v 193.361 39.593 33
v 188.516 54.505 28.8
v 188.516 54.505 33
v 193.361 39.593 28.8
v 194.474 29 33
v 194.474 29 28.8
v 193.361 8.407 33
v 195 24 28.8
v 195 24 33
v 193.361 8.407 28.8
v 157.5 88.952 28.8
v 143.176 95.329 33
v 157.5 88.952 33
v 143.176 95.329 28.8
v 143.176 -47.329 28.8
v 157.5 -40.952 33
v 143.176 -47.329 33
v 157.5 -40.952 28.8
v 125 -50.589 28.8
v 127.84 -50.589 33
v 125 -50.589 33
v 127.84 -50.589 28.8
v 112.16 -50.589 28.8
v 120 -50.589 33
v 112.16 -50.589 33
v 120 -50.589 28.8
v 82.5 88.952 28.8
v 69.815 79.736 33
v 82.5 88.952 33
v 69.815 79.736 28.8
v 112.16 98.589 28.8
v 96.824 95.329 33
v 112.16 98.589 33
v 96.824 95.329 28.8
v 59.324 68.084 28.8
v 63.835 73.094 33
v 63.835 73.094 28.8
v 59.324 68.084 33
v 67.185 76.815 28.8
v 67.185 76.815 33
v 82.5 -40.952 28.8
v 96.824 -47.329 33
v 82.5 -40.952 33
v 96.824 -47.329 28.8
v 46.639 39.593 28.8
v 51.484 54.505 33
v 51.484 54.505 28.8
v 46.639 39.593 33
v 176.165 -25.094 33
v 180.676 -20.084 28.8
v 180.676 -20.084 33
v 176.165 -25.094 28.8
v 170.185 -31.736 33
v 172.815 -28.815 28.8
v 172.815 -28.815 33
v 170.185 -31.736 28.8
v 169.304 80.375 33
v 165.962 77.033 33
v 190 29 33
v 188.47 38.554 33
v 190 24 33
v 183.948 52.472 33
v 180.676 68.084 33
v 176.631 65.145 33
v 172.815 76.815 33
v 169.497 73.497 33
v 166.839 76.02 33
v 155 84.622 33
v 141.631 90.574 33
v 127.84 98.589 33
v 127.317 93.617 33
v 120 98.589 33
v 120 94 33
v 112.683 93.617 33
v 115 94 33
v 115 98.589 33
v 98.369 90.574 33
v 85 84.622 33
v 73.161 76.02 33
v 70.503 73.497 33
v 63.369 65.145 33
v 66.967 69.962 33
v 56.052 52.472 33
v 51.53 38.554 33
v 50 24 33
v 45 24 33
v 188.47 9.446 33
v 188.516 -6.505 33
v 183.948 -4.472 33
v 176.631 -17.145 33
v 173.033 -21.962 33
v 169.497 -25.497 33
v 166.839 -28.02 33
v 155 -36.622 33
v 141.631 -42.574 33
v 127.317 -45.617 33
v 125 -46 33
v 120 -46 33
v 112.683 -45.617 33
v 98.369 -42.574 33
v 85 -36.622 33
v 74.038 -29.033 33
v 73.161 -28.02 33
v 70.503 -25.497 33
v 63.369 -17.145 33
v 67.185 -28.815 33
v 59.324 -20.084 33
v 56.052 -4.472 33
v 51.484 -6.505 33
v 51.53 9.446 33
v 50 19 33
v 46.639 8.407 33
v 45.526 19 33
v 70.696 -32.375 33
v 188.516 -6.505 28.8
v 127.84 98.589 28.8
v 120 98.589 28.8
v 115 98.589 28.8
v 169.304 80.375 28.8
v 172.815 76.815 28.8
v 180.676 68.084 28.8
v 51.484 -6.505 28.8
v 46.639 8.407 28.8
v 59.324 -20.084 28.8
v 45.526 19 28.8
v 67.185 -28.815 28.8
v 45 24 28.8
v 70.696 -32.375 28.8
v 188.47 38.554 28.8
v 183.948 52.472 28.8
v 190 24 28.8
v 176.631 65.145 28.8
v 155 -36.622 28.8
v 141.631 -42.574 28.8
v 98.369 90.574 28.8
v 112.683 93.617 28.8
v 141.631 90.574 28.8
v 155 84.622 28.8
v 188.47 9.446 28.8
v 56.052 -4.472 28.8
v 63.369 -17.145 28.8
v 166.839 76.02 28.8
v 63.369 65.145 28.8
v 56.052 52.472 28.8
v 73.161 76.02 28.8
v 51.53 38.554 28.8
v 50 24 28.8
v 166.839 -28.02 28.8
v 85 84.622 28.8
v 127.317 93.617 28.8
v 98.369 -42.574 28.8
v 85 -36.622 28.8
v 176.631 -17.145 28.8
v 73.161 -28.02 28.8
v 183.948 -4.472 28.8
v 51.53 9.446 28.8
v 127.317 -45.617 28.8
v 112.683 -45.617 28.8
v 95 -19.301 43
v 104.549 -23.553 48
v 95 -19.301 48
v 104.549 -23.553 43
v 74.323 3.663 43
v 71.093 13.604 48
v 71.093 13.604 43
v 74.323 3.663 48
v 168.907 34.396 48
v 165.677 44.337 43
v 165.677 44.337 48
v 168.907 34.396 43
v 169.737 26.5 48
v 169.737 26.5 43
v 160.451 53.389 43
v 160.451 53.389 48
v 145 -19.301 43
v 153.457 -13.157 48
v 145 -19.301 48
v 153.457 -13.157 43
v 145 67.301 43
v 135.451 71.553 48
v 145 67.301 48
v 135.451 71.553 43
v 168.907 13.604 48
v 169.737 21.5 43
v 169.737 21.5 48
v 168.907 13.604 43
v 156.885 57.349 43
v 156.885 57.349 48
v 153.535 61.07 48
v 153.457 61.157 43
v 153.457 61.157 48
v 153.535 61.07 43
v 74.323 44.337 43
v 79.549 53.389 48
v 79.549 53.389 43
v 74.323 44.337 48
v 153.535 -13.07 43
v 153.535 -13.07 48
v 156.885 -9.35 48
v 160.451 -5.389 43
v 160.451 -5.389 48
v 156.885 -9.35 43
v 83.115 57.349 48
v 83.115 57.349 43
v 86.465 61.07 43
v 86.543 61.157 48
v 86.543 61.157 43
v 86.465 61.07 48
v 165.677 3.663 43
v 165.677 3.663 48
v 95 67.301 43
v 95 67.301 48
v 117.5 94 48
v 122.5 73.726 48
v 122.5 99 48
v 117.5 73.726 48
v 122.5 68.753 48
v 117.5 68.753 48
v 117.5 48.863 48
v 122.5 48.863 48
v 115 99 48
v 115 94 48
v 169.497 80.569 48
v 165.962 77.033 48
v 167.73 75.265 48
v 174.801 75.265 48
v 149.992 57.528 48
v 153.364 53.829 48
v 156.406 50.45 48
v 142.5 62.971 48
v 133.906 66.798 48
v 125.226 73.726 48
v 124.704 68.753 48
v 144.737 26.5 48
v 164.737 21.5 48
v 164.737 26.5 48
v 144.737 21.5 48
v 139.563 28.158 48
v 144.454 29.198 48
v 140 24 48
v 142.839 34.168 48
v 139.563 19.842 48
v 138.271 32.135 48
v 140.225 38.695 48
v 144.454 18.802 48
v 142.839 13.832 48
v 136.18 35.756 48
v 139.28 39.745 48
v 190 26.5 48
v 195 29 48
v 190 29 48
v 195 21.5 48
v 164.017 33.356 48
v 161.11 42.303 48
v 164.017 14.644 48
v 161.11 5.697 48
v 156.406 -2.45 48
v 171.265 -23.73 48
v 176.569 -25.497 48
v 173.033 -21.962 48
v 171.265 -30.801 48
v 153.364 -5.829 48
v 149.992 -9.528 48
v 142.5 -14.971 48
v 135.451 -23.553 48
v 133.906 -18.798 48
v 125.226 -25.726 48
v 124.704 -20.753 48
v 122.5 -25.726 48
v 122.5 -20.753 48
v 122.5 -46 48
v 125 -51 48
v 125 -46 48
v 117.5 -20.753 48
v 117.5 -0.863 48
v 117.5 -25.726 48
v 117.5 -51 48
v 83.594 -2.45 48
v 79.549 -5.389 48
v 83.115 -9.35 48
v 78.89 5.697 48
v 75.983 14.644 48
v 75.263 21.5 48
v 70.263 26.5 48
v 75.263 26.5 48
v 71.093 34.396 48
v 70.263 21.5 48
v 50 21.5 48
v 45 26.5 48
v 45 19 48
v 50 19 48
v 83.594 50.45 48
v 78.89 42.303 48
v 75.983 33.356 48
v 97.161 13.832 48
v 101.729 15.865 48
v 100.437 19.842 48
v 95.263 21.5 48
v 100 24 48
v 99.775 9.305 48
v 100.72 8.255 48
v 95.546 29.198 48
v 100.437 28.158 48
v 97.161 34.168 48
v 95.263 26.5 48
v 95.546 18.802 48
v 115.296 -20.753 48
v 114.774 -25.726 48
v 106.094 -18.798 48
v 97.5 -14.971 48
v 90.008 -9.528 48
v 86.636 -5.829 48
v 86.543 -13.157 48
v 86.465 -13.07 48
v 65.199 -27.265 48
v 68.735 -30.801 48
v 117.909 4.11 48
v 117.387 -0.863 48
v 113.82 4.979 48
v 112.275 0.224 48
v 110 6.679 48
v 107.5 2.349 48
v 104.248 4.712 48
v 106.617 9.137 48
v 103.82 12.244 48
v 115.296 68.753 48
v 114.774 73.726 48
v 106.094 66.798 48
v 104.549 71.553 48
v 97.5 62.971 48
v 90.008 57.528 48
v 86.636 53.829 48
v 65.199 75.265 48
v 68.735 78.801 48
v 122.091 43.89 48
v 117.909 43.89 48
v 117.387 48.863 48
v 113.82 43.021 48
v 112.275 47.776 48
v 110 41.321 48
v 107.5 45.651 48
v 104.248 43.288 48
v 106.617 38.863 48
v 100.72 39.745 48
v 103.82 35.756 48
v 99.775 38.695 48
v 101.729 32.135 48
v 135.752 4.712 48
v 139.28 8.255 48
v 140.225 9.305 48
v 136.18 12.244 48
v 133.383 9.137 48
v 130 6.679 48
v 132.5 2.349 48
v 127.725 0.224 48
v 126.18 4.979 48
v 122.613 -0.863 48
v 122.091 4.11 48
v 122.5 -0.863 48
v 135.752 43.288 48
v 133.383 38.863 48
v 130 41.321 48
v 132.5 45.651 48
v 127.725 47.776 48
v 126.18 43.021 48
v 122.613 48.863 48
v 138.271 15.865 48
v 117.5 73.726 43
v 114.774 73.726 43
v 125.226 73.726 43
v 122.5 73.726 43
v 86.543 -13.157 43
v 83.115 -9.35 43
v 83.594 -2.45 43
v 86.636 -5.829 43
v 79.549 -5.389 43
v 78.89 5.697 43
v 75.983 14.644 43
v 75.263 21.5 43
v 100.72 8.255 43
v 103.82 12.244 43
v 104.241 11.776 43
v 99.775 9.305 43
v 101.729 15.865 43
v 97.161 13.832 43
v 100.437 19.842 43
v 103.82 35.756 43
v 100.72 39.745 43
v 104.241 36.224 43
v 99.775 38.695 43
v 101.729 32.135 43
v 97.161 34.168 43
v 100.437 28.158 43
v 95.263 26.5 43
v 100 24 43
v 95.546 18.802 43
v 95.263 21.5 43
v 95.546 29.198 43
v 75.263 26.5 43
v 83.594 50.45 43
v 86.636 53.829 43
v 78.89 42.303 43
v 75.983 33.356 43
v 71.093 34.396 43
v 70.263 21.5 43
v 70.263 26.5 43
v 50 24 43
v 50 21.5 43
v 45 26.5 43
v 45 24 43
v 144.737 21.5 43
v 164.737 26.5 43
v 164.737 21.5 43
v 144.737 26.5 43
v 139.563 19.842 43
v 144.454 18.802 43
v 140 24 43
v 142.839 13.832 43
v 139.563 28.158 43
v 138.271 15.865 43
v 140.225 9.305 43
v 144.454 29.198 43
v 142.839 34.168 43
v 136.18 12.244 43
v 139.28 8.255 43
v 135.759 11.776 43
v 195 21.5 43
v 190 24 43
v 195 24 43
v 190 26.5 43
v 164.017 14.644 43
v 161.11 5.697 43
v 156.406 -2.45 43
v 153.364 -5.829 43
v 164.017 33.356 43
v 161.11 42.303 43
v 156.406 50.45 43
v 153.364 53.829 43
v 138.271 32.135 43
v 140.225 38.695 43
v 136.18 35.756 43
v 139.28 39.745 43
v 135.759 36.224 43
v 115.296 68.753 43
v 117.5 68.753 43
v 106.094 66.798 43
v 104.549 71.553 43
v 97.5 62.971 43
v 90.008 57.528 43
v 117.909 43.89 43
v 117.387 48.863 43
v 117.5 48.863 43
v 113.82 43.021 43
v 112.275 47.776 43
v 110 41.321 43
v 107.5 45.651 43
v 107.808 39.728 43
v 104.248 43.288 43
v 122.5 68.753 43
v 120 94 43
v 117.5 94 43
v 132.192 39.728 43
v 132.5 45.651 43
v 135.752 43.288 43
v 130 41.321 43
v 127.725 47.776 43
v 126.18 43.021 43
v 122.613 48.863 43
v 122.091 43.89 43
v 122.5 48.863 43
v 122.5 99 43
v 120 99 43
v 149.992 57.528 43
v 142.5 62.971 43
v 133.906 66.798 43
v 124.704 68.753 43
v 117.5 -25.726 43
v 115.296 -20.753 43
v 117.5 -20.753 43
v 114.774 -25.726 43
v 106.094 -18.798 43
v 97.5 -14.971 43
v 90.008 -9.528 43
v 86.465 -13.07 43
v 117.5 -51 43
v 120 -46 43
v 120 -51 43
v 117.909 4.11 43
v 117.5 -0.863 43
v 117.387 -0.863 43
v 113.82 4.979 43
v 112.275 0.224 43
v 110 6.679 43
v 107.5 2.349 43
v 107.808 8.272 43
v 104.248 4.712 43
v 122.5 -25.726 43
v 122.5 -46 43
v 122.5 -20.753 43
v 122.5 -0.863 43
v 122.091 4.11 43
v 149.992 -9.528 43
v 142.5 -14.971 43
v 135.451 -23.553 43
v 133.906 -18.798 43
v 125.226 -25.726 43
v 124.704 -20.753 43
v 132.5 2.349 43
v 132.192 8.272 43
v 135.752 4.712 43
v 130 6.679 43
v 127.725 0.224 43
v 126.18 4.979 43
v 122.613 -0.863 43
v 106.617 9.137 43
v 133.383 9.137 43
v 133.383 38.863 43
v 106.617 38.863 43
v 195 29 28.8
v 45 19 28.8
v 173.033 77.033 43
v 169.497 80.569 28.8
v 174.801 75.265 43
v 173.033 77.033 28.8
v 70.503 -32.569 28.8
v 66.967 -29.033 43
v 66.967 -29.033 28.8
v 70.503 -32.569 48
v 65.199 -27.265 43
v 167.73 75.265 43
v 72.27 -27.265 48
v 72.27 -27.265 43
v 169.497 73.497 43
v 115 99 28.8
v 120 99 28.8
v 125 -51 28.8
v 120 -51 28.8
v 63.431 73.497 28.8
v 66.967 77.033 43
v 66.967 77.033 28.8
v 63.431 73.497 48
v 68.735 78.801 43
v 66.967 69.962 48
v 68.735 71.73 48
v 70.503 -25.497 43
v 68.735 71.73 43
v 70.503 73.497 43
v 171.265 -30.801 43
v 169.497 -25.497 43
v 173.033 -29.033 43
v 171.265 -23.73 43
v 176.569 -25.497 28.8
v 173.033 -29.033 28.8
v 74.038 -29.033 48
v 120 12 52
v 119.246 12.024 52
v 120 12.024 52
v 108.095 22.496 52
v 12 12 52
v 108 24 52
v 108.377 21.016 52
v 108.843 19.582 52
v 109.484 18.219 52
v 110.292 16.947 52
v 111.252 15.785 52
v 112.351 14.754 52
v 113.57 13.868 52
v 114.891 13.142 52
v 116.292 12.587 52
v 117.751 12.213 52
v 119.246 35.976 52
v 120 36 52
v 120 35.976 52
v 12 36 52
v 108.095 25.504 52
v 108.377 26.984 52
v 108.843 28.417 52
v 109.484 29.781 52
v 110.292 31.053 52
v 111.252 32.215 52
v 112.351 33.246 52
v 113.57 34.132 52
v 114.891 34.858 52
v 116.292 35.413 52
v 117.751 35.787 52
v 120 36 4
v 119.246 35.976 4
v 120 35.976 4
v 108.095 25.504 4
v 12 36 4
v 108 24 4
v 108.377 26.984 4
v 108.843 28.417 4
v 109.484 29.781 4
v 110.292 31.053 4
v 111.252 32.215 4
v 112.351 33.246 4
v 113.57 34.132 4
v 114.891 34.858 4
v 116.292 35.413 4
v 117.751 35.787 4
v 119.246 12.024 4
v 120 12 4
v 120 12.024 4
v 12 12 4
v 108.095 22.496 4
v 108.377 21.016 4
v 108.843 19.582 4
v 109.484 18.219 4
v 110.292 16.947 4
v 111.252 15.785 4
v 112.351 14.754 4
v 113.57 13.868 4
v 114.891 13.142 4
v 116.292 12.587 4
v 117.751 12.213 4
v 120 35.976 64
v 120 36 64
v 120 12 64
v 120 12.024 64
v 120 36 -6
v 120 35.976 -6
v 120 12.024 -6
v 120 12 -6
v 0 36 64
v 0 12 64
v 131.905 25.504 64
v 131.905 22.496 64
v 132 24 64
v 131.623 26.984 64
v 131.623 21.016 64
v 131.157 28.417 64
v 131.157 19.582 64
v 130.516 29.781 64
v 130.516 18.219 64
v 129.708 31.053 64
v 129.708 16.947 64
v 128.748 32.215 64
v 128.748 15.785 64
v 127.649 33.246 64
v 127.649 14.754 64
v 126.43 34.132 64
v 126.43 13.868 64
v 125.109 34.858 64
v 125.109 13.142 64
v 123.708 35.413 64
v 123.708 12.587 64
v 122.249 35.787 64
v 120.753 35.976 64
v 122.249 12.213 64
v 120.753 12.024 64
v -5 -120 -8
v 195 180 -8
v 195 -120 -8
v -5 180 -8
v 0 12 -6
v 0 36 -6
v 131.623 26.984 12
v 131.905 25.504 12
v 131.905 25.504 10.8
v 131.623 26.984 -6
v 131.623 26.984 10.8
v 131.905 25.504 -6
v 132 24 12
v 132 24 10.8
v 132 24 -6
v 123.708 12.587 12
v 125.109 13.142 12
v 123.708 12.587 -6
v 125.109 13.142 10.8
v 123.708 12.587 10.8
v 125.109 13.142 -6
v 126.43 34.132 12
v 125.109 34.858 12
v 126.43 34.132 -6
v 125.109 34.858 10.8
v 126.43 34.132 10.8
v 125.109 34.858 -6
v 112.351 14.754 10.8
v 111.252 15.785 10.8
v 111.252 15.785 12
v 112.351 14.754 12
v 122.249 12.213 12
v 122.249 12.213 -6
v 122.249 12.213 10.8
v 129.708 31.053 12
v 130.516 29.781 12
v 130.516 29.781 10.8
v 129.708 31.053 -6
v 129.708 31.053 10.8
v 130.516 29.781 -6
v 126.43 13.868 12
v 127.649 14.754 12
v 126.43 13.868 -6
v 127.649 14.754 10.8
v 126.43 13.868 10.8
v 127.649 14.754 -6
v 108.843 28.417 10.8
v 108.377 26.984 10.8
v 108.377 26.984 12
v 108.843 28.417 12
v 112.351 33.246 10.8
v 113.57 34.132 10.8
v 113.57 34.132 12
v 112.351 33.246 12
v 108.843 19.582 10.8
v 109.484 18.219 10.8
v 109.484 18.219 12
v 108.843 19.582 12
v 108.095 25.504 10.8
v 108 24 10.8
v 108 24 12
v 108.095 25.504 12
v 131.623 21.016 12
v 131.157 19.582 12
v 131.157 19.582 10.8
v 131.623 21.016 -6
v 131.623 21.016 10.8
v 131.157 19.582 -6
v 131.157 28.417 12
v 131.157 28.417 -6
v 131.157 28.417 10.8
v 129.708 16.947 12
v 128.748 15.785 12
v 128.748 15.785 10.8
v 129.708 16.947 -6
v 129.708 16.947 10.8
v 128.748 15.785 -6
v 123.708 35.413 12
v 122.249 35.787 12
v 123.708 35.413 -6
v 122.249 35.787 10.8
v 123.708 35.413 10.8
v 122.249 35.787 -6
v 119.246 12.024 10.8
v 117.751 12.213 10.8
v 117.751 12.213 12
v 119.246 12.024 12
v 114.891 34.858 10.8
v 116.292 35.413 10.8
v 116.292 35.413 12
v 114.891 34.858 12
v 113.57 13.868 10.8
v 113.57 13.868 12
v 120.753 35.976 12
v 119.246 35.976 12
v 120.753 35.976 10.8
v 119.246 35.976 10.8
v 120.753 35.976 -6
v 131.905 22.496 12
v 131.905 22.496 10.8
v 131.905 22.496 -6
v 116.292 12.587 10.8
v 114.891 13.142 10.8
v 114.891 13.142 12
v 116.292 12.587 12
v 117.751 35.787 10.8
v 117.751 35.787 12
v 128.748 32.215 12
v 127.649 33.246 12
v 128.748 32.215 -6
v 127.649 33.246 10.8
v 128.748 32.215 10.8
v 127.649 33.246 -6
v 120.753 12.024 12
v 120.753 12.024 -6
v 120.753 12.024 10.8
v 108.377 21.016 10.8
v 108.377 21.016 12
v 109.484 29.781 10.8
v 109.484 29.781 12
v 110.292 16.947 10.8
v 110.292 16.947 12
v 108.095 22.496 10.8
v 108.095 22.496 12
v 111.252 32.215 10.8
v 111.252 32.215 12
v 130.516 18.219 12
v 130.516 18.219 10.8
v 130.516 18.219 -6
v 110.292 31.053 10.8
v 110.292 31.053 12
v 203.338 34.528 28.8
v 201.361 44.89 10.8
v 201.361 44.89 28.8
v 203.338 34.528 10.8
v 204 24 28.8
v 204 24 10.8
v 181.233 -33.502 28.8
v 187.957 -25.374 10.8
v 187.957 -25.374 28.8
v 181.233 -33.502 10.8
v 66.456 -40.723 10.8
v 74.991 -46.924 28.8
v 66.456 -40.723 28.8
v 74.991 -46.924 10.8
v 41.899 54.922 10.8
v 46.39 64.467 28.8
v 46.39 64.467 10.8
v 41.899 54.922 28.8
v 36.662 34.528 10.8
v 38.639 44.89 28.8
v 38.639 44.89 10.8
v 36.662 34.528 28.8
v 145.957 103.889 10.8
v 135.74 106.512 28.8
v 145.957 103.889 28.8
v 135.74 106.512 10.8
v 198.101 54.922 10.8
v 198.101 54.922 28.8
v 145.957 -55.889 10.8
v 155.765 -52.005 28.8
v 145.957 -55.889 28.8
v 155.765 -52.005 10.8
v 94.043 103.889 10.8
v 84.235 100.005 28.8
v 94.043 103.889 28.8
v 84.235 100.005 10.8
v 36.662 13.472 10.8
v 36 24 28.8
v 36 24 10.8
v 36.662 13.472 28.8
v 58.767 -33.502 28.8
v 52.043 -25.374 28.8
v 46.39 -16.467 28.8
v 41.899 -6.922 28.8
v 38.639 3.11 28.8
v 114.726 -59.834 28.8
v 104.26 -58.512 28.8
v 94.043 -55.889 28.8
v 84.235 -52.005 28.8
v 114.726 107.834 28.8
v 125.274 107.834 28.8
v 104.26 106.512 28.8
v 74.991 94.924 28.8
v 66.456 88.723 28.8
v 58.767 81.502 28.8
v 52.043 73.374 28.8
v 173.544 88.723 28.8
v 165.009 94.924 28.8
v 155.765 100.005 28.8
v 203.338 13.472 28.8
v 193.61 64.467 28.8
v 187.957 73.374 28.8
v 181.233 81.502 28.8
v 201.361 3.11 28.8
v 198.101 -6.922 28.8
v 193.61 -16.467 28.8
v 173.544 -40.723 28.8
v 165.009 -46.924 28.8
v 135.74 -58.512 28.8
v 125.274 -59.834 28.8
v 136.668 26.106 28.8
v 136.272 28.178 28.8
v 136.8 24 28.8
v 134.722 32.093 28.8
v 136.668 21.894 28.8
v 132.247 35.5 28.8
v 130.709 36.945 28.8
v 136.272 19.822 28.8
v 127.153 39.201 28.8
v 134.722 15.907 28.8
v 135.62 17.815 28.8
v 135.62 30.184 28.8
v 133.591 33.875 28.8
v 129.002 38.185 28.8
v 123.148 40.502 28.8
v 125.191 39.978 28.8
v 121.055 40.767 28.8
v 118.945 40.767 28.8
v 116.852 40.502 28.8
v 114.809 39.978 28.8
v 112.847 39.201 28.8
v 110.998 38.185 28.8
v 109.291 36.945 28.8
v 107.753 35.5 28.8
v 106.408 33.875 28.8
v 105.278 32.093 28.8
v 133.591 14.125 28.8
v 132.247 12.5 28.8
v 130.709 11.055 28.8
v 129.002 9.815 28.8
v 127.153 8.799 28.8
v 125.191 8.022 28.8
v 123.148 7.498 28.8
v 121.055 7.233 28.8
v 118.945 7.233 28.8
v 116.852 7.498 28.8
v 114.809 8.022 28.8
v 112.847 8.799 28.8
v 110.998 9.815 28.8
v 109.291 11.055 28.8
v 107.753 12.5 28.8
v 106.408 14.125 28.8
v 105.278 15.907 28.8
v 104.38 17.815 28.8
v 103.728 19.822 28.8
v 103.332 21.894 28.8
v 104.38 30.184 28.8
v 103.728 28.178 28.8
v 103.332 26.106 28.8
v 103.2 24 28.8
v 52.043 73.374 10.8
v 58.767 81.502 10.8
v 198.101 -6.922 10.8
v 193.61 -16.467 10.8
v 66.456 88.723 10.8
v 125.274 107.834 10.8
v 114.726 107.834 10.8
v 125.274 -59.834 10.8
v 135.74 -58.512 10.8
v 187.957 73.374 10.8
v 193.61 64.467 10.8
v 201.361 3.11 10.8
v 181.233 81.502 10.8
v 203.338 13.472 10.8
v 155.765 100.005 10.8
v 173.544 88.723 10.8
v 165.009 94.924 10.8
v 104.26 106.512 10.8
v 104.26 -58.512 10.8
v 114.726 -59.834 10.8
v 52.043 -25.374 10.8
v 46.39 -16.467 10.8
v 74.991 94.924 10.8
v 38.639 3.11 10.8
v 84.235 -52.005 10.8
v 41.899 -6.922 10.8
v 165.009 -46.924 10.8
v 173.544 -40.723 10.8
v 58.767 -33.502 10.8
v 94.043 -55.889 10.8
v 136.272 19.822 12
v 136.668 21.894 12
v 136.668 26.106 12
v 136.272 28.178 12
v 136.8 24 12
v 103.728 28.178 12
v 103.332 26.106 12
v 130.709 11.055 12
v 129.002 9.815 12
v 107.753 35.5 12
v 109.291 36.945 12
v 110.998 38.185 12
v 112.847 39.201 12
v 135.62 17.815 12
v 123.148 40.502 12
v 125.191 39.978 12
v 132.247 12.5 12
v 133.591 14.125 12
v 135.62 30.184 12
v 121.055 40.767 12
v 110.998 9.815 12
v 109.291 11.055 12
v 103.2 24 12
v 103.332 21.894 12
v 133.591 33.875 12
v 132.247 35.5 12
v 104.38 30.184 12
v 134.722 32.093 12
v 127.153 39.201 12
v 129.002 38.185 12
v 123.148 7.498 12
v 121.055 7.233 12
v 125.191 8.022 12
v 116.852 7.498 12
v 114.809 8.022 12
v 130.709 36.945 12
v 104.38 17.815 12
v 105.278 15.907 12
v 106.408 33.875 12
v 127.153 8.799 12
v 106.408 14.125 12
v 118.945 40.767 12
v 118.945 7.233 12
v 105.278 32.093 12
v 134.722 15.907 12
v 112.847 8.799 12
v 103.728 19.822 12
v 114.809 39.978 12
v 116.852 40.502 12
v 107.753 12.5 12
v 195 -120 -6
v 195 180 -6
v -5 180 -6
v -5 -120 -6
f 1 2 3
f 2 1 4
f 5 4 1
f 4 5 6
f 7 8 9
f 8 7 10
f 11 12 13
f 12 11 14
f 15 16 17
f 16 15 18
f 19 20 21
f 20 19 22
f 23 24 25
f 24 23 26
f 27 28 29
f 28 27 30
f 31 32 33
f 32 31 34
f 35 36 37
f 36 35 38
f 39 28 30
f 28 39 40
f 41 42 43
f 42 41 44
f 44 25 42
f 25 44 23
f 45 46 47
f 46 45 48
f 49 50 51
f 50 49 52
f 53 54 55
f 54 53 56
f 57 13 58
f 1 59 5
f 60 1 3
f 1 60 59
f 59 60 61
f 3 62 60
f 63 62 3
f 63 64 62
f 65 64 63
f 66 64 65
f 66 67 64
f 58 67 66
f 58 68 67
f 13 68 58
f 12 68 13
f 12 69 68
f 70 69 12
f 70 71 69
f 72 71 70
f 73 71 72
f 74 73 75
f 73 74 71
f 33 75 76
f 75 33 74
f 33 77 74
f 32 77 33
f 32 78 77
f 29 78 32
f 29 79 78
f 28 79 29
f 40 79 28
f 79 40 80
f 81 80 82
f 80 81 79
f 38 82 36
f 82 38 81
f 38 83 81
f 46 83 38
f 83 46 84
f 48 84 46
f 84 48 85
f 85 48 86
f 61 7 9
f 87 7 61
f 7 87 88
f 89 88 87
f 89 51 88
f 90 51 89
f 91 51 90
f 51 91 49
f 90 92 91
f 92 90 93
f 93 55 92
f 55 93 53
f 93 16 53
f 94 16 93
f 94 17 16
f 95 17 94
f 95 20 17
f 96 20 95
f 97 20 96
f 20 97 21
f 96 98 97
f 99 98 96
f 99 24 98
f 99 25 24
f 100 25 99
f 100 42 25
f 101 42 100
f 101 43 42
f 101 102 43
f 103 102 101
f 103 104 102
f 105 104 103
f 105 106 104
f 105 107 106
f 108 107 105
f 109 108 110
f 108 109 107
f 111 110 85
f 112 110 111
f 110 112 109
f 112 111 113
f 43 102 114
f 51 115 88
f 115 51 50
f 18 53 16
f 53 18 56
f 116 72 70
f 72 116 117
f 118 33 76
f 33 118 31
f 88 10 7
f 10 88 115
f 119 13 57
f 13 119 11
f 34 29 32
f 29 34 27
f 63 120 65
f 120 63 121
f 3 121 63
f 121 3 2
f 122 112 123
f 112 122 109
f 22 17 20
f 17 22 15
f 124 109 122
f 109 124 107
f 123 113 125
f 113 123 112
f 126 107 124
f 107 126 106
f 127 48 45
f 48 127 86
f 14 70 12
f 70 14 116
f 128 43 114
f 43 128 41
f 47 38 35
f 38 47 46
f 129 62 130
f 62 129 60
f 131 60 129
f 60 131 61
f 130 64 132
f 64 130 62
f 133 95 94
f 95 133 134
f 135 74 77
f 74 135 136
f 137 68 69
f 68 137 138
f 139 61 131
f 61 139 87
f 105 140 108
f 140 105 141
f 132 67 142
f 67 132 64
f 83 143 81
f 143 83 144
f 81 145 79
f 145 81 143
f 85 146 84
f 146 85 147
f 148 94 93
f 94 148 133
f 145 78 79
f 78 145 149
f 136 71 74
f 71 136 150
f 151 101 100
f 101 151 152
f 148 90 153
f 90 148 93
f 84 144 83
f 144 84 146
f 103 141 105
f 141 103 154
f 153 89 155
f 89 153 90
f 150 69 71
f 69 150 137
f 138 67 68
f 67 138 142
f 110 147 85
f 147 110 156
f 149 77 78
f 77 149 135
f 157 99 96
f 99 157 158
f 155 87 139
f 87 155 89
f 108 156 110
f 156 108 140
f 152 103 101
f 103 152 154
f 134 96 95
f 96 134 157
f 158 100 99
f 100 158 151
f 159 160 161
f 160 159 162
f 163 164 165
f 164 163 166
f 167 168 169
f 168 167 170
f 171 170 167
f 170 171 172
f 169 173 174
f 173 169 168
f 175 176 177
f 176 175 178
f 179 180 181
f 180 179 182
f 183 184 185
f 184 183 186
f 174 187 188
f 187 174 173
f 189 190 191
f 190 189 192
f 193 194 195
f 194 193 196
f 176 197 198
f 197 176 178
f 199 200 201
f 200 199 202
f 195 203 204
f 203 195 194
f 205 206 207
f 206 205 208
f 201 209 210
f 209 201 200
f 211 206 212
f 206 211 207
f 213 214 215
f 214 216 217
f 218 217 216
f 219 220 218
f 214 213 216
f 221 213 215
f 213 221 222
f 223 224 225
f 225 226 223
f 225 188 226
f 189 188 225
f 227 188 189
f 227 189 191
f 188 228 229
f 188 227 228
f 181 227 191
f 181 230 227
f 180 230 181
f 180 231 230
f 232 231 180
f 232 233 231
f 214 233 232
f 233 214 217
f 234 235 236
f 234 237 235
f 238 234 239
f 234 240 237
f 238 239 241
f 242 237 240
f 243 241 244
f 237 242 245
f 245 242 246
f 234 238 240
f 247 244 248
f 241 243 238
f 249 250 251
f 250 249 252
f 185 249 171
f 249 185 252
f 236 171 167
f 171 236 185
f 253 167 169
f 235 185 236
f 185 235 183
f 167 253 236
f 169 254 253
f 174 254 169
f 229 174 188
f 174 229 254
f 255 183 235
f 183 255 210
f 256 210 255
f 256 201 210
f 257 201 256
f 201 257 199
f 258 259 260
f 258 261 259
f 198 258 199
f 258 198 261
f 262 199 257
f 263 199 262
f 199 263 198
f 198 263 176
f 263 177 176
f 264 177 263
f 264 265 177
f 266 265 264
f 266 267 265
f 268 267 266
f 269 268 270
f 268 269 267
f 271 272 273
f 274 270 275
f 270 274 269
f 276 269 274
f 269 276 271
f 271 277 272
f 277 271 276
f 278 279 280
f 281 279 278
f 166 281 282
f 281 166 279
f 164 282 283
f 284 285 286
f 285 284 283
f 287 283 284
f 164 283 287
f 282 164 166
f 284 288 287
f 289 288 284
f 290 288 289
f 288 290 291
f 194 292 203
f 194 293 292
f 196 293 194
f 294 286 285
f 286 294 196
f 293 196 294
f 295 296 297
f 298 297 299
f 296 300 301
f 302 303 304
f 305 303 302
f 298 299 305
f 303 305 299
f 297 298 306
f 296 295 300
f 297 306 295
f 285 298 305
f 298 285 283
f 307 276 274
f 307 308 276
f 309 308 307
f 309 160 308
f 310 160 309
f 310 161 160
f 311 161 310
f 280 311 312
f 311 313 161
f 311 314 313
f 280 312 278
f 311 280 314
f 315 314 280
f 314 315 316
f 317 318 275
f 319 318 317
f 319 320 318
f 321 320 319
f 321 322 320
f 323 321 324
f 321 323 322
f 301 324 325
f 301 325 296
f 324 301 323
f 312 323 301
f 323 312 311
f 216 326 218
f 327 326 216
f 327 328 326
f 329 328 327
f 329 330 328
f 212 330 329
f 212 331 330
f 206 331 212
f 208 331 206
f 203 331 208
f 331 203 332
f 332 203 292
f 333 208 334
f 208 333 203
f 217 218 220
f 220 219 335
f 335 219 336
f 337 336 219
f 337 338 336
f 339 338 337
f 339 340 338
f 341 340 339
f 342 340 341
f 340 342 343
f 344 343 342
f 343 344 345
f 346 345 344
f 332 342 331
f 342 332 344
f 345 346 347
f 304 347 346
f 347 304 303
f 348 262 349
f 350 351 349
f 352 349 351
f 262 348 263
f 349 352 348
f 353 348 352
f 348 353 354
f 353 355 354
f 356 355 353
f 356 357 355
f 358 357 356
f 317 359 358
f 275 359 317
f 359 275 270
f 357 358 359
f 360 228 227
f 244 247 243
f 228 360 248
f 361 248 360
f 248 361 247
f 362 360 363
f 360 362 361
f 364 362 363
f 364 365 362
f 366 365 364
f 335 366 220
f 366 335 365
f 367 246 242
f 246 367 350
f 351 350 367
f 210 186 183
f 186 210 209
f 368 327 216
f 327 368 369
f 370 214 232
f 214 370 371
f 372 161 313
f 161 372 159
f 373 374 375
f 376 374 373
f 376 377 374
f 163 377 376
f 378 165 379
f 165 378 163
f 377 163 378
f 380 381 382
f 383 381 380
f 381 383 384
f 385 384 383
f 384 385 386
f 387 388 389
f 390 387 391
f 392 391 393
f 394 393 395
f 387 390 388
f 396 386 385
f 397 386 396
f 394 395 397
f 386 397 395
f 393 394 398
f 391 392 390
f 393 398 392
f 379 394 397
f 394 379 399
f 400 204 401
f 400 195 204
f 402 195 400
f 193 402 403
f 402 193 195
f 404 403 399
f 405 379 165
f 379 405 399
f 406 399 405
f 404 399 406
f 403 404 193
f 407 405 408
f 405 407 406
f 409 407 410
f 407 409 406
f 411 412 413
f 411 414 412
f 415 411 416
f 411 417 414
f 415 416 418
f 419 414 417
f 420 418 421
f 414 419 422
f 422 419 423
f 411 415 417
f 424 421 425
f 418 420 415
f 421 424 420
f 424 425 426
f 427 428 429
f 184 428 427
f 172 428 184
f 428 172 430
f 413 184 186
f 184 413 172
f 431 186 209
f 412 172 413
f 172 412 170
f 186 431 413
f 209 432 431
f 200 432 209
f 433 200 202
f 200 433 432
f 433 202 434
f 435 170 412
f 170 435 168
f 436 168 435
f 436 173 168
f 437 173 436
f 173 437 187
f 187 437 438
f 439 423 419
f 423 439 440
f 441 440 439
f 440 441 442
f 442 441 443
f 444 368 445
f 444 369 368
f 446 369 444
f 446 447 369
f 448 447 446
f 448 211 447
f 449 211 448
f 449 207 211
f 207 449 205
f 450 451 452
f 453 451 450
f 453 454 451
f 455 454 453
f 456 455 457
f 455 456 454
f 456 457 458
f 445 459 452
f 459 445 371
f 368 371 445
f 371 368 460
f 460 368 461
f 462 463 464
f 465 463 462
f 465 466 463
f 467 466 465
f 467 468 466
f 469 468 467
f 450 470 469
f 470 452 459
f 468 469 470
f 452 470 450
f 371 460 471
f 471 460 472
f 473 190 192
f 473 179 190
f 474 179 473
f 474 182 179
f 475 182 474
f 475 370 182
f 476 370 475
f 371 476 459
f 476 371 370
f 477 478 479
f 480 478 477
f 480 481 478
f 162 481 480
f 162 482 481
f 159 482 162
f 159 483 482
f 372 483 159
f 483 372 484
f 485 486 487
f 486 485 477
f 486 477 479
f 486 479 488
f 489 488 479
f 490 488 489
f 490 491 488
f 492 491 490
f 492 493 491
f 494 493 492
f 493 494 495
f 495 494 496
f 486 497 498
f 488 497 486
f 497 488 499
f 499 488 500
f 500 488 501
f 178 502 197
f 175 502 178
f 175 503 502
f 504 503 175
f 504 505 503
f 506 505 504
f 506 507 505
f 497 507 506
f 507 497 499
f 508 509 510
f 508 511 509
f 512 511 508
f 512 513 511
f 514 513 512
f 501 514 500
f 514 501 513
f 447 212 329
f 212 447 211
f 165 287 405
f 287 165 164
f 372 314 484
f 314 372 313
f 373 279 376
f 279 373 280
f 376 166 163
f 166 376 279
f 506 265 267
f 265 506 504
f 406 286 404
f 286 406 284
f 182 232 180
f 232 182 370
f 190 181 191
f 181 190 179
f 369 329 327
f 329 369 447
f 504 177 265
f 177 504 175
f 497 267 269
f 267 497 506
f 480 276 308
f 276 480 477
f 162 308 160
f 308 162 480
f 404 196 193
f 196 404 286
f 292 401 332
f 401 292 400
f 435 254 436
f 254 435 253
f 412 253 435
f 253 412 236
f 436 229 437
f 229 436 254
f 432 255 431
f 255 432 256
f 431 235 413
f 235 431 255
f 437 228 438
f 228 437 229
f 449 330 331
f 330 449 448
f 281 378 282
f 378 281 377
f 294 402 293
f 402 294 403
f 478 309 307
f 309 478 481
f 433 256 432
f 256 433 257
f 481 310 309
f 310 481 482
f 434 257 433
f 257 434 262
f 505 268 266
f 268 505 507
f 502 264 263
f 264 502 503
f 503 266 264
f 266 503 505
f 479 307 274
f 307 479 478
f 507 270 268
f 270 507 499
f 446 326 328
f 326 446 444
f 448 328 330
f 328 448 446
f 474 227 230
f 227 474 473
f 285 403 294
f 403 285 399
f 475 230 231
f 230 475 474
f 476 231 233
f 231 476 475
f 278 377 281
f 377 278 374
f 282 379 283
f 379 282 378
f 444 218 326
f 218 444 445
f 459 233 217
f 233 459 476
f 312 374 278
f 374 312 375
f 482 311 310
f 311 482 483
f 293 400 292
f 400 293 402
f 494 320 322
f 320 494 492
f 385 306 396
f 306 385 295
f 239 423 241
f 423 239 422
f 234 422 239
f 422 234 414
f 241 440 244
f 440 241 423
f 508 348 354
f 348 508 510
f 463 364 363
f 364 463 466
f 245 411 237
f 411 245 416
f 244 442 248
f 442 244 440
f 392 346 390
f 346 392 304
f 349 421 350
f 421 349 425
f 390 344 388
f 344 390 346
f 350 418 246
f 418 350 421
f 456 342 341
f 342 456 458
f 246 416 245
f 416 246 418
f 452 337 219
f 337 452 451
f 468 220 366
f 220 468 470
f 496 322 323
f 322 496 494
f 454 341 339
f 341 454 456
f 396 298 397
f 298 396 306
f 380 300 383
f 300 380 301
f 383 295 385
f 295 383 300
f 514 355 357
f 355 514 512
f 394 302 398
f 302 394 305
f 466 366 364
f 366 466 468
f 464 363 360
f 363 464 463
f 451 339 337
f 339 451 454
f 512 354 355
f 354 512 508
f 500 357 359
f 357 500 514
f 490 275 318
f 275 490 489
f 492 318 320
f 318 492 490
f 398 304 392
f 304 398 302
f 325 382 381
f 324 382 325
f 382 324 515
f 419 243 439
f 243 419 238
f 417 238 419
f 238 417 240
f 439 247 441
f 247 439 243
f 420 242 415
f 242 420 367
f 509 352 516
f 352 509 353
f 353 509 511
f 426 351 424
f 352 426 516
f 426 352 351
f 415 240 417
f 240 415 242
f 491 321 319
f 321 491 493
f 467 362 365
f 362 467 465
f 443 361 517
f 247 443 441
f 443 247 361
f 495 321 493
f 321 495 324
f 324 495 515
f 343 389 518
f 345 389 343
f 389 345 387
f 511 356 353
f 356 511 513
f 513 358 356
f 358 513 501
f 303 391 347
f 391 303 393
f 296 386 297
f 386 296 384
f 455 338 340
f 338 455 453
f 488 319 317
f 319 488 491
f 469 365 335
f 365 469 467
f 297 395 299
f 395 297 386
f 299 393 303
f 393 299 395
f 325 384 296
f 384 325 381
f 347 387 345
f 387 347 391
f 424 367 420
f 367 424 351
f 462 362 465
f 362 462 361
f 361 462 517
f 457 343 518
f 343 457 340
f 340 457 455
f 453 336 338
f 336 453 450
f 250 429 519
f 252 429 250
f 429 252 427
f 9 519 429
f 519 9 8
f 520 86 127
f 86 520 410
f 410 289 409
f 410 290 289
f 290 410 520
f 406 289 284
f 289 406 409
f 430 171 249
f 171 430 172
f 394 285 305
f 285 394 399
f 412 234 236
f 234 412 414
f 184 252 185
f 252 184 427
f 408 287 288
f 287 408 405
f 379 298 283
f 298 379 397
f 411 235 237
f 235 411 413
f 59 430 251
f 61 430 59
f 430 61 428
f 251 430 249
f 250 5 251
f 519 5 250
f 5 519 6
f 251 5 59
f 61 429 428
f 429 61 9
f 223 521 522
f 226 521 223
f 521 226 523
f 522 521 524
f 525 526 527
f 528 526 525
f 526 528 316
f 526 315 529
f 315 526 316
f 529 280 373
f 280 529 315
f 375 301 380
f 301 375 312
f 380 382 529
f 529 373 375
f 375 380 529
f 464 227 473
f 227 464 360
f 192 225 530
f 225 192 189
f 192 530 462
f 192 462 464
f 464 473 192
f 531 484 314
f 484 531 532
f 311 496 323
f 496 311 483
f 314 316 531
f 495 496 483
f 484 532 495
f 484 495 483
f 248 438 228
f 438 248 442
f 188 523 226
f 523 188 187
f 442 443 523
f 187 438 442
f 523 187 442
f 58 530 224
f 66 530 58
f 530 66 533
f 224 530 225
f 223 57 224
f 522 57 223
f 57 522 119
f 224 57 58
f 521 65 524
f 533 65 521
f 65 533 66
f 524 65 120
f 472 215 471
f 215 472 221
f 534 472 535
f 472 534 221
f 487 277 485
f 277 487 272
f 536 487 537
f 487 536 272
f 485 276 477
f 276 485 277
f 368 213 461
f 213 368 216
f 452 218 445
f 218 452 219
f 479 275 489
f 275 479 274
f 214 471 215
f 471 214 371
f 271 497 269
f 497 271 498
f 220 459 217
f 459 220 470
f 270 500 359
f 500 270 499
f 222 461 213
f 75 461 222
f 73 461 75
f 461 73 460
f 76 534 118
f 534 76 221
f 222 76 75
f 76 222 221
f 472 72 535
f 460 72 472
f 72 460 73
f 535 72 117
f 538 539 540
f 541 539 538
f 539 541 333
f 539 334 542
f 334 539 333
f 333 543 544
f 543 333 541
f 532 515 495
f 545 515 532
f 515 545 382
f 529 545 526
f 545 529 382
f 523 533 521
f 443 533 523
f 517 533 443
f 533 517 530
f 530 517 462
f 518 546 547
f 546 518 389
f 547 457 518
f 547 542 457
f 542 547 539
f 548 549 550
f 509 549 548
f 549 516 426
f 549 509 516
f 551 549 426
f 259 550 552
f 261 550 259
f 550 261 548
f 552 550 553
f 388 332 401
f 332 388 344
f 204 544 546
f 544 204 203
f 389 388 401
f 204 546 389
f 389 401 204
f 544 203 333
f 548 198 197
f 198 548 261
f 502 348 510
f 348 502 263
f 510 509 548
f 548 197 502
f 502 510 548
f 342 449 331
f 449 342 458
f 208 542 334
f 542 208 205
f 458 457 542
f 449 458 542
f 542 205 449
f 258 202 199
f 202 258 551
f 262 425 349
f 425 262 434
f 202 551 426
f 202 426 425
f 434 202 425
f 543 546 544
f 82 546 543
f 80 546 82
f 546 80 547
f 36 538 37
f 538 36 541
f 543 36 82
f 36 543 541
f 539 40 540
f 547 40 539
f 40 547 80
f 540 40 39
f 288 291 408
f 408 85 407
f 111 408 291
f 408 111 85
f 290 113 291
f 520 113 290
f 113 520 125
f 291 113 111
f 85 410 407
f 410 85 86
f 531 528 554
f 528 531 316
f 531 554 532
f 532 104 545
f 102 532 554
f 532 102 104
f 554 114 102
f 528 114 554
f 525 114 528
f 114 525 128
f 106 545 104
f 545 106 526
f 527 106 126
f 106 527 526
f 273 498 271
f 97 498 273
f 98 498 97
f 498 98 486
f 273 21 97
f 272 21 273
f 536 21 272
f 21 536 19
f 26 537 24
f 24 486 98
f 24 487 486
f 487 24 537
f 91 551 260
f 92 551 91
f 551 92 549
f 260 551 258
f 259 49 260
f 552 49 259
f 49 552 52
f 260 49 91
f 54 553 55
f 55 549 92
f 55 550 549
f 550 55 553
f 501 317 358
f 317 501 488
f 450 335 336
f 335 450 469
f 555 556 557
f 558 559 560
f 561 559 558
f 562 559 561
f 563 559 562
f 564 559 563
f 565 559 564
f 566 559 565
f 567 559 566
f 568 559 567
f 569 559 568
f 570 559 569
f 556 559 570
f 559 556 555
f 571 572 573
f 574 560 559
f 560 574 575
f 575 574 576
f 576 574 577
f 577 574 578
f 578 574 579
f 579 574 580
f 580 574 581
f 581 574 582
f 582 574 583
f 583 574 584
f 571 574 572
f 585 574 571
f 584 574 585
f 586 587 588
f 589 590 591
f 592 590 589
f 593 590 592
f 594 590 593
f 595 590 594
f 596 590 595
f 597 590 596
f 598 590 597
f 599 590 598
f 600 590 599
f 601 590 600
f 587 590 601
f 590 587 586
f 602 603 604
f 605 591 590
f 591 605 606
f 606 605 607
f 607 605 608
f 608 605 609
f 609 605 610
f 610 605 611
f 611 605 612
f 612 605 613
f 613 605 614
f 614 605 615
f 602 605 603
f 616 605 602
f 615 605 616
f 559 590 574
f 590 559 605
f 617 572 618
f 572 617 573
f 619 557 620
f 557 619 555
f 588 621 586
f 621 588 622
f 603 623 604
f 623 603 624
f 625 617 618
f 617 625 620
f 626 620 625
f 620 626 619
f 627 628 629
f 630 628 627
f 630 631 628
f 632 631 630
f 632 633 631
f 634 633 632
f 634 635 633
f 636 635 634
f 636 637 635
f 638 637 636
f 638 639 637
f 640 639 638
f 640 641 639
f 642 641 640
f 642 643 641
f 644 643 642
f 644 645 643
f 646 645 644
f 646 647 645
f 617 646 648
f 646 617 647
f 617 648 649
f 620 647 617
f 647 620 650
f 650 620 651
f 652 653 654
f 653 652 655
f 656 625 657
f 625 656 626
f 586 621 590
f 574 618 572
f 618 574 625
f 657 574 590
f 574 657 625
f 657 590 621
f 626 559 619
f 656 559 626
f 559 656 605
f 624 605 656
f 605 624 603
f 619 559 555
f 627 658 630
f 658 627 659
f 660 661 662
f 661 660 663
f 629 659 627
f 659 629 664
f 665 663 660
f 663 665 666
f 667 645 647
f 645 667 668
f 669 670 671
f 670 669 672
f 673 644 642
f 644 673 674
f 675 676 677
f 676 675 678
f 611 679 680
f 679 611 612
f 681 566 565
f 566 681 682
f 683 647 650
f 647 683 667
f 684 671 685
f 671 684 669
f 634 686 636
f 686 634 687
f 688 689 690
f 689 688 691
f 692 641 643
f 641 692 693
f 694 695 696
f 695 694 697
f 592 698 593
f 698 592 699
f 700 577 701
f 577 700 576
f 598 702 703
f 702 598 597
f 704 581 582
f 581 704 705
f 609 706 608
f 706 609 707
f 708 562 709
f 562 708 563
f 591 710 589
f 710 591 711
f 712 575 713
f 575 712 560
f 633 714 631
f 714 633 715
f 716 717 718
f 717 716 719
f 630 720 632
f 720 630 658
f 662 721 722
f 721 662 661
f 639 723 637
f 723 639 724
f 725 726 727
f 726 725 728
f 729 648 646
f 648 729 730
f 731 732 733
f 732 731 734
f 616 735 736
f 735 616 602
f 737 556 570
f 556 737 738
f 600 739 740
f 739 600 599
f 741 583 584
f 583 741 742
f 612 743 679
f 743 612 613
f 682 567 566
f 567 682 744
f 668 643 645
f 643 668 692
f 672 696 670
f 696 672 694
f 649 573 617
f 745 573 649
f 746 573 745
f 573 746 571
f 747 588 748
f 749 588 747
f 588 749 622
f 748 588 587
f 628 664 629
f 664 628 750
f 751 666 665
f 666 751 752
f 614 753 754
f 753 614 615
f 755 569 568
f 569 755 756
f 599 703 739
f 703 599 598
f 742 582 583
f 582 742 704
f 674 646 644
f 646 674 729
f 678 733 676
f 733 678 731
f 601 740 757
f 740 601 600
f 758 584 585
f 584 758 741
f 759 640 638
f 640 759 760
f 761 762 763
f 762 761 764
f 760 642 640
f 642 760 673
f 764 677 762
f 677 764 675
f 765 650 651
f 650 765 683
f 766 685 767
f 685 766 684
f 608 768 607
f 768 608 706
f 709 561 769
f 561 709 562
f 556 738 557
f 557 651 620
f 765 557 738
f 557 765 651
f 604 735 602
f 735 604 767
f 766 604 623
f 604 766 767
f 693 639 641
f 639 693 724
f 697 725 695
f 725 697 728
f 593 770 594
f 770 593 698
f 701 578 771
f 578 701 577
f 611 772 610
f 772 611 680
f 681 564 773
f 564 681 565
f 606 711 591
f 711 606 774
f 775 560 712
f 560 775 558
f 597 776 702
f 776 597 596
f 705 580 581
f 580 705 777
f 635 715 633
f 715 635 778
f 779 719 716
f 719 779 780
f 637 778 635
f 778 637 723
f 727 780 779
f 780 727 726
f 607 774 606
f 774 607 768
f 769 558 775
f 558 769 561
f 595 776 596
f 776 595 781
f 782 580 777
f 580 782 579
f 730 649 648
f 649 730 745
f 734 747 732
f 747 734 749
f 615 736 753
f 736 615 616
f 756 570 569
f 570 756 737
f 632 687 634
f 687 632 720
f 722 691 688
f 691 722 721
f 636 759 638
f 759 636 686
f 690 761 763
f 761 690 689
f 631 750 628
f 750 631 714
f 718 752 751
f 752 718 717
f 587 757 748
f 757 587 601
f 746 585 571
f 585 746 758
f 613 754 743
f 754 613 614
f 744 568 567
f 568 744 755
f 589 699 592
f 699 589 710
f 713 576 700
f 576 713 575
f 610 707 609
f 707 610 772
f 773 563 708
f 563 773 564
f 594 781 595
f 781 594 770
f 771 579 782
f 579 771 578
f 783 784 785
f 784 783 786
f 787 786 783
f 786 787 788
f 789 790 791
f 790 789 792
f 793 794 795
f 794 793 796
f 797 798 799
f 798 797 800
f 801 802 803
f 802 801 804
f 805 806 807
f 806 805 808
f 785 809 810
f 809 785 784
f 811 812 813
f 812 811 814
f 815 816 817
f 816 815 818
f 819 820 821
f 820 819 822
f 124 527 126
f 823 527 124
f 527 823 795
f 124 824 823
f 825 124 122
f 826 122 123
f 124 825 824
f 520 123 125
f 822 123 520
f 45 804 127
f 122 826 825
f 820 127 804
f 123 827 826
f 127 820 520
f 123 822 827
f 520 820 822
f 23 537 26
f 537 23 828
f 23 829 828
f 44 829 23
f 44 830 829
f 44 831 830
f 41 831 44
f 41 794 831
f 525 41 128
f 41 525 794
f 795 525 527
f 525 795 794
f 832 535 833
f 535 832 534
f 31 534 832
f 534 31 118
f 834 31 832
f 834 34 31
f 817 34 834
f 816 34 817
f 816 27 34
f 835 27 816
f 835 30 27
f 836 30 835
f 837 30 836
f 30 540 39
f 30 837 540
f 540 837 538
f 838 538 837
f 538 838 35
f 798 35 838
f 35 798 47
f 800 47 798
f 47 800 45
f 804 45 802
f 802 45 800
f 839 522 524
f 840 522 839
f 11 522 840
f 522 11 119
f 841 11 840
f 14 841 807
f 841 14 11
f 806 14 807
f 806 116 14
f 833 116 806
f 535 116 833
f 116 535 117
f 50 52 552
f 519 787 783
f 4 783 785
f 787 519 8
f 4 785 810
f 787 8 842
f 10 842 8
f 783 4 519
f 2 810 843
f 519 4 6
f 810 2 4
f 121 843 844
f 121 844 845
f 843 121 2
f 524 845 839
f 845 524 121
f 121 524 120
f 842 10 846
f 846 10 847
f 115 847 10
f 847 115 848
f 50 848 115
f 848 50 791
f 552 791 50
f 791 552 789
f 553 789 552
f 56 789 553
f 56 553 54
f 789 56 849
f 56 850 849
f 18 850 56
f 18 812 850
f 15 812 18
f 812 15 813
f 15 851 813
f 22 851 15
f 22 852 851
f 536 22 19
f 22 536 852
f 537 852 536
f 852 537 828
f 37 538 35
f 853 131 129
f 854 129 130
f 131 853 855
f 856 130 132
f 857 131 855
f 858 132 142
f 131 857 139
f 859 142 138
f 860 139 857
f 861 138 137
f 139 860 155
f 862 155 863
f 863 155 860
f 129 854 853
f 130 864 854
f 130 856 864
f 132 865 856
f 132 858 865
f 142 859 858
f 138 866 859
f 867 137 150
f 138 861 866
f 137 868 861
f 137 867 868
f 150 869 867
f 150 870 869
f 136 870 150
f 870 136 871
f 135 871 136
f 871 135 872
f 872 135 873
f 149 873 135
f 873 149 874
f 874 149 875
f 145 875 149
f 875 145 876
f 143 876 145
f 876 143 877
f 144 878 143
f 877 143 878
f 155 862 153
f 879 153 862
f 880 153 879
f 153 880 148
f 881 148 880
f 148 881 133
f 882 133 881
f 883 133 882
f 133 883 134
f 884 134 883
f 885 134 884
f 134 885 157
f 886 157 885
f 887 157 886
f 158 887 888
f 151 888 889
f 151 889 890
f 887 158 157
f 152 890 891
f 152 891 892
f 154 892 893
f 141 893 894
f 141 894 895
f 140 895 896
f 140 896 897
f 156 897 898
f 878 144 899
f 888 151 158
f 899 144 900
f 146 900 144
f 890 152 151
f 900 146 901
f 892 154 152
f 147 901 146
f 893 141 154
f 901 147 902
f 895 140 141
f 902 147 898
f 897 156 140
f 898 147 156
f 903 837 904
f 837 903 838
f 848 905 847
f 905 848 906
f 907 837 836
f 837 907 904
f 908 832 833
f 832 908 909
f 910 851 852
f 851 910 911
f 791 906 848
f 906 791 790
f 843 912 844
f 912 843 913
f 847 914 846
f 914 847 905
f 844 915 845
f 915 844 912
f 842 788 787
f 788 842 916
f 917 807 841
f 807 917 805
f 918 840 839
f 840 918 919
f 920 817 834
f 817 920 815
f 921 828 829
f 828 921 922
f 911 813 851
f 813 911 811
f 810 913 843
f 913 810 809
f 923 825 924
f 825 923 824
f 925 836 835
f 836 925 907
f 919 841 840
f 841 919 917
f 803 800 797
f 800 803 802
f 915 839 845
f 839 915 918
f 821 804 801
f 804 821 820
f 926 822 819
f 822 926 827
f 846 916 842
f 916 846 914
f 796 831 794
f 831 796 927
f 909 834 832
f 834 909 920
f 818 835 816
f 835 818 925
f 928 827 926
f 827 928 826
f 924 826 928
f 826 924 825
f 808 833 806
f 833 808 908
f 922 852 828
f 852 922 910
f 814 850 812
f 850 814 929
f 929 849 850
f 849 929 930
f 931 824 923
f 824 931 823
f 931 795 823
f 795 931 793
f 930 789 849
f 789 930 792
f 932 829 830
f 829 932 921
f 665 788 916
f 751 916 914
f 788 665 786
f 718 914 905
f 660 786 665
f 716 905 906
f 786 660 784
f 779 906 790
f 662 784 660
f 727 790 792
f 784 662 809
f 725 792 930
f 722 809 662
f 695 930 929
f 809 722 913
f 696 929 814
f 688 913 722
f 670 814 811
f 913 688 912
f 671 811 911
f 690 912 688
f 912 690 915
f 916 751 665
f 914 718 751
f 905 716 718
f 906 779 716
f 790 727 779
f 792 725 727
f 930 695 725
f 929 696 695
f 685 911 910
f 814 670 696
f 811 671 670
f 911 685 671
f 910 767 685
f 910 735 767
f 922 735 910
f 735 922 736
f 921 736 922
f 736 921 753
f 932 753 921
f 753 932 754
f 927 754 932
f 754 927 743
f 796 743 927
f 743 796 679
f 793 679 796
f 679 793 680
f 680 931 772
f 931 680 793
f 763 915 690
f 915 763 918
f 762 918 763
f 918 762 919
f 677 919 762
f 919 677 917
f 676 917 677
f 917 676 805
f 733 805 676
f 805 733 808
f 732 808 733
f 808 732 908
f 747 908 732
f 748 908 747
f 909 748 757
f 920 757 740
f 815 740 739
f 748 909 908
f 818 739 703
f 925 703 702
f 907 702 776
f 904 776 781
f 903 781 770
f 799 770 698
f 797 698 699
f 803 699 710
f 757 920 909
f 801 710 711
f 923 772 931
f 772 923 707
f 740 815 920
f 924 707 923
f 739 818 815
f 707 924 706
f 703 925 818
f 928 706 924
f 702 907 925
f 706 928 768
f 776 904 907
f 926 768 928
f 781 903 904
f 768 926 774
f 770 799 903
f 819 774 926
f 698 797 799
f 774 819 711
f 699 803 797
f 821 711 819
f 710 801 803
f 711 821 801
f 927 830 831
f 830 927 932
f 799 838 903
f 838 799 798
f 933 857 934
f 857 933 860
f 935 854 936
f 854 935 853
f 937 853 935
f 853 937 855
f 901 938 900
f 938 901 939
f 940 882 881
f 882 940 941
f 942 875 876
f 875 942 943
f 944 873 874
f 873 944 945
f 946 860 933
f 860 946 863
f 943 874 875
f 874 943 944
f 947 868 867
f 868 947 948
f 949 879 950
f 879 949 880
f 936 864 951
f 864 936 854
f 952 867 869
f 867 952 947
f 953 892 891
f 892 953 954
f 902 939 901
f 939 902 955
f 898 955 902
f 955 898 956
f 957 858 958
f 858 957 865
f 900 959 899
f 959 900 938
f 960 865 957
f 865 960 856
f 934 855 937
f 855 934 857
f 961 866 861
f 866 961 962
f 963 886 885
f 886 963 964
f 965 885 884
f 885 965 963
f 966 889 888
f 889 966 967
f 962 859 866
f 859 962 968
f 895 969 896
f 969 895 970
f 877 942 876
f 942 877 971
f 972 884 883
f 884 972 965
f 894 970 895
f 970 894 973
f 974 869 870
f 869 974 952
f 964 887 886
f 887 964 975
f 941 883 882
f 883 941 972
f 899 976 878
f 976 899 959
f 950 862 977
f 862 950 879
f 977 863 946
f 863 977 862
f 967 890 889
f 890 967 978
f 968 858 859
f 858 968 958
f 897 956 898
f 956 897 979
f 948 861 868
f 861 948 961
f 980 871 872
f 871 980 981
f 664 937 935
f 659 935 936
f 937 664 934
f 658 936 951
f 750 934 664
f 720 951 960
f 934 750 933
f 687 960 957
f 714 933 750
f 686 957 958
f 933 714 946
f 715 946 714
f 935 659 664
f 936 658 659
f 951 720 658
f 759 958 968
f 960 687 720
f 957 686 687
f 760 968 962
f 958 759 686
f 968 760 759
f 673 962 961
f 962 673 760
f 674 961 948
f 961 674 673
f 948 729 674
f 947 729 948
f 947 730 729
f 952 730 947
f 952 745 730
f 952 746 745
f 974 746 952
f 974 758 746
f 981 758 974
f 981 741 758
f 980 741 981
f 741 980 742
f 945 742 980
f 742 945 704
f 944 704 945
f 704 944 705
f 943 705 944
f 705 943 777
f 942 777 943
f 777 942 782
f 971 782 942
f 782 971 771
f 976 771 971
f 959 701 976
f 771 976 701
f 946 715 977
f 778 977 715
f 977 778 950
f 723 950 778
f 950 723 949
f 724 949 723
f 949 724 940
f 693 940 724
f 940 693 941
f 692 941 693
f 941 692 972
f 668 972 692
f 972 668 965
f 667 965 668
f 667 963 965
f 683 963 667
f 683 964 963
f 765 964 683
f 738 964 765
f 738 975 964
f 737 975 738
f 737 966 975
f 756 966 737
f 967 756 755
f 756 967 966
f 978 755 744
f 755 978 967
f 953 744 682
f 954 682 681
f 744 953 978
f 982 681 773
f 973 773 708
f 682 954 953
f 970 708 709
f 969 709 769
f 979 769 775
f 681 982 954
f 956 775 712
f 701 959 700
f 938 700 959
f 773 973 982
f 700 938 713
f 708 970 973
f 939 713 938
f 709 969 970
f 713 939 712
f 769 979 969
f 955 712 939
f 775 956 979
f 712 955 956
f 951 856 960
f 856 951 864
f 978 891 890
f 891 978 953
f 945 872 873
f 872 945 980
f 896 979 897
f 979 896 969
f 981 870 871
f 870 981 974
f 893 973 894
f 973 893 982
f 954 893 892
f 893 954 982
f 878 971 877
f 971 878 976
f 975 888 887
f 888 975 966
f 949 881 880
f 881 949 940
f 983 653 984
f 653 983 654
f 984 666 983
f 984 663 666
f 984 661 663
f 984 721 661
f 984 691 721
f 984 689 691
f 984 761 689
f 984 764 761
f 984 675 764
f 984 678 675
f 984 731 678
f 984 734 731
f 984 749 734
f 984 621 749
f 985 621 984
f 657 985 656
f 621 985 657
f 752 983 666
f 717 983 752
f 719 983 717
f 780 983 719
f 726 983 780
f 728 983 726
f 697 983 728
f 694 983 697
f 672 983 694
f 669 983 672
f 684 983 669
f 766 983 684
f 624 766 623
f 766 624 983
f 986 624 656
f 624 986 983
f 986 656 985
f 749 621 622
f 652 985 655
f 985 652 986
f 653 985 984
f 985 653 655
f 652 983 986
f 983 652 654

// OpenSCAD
// file: wheel-v2.scad
module inner(){
 	translate([-.5,0,0])
 		cube([8,8,2]);
 	cube([9,7,2]);
 }
 
 module box(){

	translate([0,0.5,0])
 	difference(){
 		cube([5,1,3]);
 
 		translate([1,-0.5,0.5])
 			inner();
 	}
 	
 	translate([5,1,0])
 		cylinder(r=0.5, h=3, $fn=50);
 }
 
 module roller(){
 	difference(){
 		color("red")
 			translate([5,1,0.9])
 			cylinder(r=3.5, h=1.5, $fn=50);
 
 		translate([5,1,1])
 			cylinder(r=0.7, h=3, $fn=50);
 	}
 }
 
 module vex(){
 	translate([5, 1, 1.5])
 		for( i = [0:5] ){
 
 			rotate(i*360/6, [0,0,1])
 			translate([0, 3, 0])
 			cylinder(r=0.4, h=0.5, $fn=50);
 	}
 }
 
 box();
 roller();
 //vex();
// main file
use <wheel-v2.scad>;

module wheel(factor){

	translate([0,0,-8]) scale([factor*2, factor*2, factor*2])
		box();
	scale([factor*2, factor*2, factor])	
		roller();

}

module frame(factor){
	//http://www.thingiverse.com/thing:95869
	difference() {
		scale([factor, factor, factor])
		//import("component/FerrisWheel.stl");
		import("component/ferris.stl");
		translate([-110, -44, -30]) rotate([0,0,2])
			cube([200, 40, 200]);
	}
}

module ferris(factor){

	//outer frame
	difference(){
		cylinder(r=30*factor, h=2*factor);

		translate([0,0,-1])
			cylinder(r=28*factor, h=4*factor);
	}

	translate([0, 0, 6*factor]) difference(){
		cylinder(r=20*factor, h=2*factor);

		translate([0,0,-1])
			cylinder(r=18*factor, h=4*factor);
	}

	//inner frame
	translate([0, 0, 6*factor]) difference(){
		cylinder(r=10*factor, h=2*factor);

		translate([0,0,-1])
			cylinder(r=8*factor, h=4*factor);
	}

	for(i=[0 : 8])
	rotate(i*360/8, [0,0,1]){
		translate([0,0, 7*factor]) cube([60*factor, 2*factor, 2*factor], center=true);
		translate([28*factor, 0, 0]) cube([2*factor,2*factor,8*factor]);
	}

}

translate([120, 24, 28])
difference(){
	ferris(2.5);

	//hole in the middle
	cylinder(r=20, h=42, center=true);
}



//base
translate([-5, -120, -8])
	cube([200, 300, 2]);

wheel(12);

//translate([30, 85, 37]) rotate([180, 0, 0])
//	frame(1);
